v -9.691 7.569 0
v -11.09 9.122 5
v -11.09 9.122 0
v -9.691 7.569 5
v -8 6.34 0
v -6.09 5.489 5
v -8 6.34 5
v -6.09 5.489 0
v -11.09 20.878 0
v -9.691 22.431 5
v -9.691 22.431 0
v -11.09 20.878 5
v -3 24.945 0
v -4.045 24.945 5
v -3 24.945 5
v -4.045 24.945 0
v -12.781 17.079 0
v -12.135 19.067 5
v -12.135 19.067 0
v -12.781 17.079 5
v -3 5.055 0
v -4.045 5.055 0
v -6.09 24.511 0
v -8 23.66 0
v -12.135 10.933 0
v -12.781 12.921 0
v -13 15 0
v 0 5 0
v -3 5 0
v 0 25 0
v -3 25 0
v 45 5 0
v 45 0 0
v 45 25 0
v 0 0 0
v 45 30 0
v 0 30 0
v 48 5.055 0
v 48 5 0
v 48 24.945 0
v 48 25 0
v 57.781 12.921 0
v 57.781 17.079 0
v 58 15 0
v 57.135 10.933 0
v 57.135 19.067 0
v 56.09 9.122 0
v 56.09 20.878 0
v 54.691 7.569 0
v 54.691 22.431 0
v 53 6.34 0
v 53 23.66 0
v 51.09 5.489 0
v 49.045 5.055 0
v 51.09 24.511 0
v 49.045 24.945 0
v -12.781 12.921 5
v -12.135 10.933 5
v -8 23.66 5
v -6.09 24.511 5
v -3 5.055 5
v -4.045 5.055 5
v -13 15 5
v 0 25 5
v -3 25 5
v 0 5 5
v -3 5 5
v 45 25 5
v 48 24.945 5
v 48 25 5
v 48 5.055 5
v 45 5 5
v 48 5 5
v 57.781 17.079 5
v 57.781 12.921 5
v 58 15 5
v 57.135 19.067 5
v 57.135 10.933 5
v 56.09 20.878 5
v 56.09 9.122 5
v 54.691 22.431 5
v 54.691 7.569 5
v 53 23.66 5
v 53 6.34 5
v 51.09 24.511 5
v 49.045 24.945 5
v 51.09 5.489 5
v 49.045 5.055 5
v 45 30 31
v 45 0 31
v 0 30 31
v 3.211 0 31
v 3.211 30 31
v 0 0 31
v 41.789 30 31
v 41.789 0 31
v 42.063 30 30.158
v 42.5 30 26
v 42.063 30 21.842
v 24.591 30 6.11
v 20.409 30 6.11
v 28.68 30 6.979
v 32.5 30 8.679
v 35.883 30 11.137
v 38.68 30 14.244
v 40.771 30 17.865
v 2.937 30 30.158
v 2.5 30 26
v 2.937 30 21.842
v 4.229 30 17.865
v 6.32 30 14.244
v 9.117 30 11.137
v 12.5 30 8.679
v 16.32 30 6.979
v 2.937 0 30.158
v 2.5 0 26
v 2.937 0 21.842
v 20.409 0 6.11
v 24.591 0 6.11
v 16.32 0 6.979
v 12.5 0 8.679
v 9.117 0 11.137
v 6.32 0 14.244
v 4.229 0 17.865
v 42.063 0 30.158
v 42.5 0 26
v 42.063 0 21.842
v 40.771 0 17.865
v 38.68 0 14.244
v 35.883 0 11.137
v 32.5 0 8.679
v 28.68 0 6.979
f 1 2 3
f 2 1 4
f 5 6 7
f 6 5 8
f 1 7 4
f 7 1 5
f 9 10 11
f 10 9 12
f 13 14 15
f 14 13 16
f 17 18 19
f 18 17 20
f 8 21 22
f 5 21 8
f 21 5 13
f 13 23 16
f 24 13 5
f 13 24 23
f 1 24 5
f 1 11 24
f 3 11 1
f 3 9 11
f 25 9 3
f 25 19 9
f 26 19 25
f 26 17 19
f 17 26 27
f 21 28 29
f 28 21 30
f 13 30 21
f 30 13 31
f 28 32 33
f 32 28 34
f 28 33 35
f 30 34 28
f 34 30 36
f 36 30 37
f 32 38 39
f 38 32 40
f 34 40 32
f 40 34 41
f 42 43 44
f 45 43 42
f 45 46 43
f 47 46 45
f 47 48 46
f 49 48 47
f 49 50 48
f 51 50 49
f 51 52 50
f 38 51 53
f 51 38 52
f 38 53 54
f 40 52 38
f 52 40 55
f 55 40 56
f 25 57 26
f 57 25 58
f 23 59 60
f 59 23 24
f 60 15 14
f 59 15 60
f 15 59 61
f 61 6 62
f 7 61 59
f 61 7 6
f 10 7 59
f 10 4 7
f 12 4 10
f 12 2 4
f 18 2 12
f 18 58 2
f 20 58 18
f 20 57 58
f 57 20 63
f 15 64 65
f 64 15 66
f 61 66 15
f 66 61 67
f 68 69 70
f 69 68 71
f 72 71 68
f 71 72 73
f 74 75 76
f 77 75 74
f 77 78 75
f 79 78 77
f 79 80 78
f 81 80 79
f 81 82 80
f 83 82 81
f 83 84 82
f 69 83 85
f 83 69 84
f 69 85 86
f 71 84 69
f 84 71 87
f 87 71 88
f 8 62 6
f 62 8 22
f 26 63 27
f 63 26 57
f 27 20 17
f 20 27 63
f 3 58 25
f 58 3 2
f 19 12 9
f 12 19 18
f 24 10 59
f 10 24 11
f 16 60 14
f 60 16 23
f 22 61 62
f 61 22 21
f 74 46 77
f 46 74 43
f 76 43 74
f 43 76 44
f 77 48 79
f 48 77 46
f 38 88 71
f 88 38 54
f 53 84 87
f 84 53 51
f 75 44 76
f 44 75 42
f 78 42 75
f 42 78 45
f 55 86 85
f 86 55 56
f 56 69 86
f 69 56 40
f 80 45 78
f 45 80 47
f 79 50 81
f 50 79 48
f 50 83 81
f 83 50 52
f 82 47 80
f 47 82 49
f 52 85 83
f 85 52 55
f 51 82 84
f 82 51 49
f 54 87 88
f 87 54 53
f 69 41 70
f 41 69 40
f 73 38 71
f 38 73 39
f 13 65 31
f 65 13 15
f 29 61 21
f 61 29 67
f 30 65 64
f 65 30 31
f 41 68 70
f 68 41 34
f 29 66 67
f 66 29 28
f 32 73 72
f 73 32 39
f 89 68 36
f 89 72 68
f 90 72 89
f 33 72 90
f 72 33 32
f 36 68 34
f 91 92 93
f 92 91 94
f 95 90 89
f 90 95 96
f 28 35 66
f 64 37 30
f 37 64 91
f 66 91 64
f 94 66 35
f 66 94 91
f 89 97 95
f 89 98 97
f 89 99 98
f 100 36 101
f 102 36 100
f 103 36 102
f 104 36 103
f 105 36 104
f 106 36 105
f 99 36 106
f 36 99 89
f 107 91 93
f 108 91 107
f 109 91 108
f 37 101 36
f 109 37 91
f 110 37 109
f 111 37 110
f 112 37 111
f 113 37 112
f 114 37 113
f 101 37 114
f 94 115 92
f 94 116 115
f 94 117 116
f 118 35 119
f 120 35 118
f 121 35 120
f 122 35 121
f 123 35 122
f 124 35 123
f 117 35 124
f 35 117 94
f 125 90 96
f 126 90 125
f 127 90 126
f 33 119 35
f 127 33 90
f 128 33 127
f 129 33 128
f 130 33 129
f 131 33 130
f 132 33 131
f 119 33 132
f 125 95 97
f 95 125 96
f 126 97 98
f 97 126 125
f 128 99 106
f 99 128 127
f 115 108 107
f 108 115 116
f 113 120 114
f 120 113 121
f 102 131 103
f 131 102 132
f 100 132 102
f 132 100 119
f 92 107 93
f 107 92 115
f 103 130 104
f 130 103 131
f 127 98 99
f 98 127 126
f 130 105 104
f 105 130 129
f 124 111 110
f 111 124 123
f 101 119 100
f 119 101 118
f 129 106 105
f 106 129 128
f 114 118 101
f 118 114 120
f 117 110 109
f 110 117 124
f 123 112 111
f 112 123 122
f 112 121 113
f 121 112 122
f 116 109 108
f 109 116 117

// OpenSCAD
GDiam = 40;
Overhang = 5;
Elevation = 6;

X = GDiam + 5;
Y = 30;
Z = GDiam / 2 + Overhang + Elevation;

hR = 10;
hD = 3;
hZ = 5;
difference(){
	union(){
		translate([0,Y/2,0]) { 
			translate([-hD,0,0]) cylinder(hZ, hR, hR);
			translate([X+hD,0,0]) cylinder(hZ, hR, hR);
		}
		translate([-hD,Y/2-hR,0]) cube([X + (hD * 2) ,hR * 2,5]);
		cube([X,Y,Z]);
	}
translate([X/2, Y, Z-Overhang]) rotate([90, 0, 0]) cylinder(Y, GDiam / 2 , GDiam / 2);
}
